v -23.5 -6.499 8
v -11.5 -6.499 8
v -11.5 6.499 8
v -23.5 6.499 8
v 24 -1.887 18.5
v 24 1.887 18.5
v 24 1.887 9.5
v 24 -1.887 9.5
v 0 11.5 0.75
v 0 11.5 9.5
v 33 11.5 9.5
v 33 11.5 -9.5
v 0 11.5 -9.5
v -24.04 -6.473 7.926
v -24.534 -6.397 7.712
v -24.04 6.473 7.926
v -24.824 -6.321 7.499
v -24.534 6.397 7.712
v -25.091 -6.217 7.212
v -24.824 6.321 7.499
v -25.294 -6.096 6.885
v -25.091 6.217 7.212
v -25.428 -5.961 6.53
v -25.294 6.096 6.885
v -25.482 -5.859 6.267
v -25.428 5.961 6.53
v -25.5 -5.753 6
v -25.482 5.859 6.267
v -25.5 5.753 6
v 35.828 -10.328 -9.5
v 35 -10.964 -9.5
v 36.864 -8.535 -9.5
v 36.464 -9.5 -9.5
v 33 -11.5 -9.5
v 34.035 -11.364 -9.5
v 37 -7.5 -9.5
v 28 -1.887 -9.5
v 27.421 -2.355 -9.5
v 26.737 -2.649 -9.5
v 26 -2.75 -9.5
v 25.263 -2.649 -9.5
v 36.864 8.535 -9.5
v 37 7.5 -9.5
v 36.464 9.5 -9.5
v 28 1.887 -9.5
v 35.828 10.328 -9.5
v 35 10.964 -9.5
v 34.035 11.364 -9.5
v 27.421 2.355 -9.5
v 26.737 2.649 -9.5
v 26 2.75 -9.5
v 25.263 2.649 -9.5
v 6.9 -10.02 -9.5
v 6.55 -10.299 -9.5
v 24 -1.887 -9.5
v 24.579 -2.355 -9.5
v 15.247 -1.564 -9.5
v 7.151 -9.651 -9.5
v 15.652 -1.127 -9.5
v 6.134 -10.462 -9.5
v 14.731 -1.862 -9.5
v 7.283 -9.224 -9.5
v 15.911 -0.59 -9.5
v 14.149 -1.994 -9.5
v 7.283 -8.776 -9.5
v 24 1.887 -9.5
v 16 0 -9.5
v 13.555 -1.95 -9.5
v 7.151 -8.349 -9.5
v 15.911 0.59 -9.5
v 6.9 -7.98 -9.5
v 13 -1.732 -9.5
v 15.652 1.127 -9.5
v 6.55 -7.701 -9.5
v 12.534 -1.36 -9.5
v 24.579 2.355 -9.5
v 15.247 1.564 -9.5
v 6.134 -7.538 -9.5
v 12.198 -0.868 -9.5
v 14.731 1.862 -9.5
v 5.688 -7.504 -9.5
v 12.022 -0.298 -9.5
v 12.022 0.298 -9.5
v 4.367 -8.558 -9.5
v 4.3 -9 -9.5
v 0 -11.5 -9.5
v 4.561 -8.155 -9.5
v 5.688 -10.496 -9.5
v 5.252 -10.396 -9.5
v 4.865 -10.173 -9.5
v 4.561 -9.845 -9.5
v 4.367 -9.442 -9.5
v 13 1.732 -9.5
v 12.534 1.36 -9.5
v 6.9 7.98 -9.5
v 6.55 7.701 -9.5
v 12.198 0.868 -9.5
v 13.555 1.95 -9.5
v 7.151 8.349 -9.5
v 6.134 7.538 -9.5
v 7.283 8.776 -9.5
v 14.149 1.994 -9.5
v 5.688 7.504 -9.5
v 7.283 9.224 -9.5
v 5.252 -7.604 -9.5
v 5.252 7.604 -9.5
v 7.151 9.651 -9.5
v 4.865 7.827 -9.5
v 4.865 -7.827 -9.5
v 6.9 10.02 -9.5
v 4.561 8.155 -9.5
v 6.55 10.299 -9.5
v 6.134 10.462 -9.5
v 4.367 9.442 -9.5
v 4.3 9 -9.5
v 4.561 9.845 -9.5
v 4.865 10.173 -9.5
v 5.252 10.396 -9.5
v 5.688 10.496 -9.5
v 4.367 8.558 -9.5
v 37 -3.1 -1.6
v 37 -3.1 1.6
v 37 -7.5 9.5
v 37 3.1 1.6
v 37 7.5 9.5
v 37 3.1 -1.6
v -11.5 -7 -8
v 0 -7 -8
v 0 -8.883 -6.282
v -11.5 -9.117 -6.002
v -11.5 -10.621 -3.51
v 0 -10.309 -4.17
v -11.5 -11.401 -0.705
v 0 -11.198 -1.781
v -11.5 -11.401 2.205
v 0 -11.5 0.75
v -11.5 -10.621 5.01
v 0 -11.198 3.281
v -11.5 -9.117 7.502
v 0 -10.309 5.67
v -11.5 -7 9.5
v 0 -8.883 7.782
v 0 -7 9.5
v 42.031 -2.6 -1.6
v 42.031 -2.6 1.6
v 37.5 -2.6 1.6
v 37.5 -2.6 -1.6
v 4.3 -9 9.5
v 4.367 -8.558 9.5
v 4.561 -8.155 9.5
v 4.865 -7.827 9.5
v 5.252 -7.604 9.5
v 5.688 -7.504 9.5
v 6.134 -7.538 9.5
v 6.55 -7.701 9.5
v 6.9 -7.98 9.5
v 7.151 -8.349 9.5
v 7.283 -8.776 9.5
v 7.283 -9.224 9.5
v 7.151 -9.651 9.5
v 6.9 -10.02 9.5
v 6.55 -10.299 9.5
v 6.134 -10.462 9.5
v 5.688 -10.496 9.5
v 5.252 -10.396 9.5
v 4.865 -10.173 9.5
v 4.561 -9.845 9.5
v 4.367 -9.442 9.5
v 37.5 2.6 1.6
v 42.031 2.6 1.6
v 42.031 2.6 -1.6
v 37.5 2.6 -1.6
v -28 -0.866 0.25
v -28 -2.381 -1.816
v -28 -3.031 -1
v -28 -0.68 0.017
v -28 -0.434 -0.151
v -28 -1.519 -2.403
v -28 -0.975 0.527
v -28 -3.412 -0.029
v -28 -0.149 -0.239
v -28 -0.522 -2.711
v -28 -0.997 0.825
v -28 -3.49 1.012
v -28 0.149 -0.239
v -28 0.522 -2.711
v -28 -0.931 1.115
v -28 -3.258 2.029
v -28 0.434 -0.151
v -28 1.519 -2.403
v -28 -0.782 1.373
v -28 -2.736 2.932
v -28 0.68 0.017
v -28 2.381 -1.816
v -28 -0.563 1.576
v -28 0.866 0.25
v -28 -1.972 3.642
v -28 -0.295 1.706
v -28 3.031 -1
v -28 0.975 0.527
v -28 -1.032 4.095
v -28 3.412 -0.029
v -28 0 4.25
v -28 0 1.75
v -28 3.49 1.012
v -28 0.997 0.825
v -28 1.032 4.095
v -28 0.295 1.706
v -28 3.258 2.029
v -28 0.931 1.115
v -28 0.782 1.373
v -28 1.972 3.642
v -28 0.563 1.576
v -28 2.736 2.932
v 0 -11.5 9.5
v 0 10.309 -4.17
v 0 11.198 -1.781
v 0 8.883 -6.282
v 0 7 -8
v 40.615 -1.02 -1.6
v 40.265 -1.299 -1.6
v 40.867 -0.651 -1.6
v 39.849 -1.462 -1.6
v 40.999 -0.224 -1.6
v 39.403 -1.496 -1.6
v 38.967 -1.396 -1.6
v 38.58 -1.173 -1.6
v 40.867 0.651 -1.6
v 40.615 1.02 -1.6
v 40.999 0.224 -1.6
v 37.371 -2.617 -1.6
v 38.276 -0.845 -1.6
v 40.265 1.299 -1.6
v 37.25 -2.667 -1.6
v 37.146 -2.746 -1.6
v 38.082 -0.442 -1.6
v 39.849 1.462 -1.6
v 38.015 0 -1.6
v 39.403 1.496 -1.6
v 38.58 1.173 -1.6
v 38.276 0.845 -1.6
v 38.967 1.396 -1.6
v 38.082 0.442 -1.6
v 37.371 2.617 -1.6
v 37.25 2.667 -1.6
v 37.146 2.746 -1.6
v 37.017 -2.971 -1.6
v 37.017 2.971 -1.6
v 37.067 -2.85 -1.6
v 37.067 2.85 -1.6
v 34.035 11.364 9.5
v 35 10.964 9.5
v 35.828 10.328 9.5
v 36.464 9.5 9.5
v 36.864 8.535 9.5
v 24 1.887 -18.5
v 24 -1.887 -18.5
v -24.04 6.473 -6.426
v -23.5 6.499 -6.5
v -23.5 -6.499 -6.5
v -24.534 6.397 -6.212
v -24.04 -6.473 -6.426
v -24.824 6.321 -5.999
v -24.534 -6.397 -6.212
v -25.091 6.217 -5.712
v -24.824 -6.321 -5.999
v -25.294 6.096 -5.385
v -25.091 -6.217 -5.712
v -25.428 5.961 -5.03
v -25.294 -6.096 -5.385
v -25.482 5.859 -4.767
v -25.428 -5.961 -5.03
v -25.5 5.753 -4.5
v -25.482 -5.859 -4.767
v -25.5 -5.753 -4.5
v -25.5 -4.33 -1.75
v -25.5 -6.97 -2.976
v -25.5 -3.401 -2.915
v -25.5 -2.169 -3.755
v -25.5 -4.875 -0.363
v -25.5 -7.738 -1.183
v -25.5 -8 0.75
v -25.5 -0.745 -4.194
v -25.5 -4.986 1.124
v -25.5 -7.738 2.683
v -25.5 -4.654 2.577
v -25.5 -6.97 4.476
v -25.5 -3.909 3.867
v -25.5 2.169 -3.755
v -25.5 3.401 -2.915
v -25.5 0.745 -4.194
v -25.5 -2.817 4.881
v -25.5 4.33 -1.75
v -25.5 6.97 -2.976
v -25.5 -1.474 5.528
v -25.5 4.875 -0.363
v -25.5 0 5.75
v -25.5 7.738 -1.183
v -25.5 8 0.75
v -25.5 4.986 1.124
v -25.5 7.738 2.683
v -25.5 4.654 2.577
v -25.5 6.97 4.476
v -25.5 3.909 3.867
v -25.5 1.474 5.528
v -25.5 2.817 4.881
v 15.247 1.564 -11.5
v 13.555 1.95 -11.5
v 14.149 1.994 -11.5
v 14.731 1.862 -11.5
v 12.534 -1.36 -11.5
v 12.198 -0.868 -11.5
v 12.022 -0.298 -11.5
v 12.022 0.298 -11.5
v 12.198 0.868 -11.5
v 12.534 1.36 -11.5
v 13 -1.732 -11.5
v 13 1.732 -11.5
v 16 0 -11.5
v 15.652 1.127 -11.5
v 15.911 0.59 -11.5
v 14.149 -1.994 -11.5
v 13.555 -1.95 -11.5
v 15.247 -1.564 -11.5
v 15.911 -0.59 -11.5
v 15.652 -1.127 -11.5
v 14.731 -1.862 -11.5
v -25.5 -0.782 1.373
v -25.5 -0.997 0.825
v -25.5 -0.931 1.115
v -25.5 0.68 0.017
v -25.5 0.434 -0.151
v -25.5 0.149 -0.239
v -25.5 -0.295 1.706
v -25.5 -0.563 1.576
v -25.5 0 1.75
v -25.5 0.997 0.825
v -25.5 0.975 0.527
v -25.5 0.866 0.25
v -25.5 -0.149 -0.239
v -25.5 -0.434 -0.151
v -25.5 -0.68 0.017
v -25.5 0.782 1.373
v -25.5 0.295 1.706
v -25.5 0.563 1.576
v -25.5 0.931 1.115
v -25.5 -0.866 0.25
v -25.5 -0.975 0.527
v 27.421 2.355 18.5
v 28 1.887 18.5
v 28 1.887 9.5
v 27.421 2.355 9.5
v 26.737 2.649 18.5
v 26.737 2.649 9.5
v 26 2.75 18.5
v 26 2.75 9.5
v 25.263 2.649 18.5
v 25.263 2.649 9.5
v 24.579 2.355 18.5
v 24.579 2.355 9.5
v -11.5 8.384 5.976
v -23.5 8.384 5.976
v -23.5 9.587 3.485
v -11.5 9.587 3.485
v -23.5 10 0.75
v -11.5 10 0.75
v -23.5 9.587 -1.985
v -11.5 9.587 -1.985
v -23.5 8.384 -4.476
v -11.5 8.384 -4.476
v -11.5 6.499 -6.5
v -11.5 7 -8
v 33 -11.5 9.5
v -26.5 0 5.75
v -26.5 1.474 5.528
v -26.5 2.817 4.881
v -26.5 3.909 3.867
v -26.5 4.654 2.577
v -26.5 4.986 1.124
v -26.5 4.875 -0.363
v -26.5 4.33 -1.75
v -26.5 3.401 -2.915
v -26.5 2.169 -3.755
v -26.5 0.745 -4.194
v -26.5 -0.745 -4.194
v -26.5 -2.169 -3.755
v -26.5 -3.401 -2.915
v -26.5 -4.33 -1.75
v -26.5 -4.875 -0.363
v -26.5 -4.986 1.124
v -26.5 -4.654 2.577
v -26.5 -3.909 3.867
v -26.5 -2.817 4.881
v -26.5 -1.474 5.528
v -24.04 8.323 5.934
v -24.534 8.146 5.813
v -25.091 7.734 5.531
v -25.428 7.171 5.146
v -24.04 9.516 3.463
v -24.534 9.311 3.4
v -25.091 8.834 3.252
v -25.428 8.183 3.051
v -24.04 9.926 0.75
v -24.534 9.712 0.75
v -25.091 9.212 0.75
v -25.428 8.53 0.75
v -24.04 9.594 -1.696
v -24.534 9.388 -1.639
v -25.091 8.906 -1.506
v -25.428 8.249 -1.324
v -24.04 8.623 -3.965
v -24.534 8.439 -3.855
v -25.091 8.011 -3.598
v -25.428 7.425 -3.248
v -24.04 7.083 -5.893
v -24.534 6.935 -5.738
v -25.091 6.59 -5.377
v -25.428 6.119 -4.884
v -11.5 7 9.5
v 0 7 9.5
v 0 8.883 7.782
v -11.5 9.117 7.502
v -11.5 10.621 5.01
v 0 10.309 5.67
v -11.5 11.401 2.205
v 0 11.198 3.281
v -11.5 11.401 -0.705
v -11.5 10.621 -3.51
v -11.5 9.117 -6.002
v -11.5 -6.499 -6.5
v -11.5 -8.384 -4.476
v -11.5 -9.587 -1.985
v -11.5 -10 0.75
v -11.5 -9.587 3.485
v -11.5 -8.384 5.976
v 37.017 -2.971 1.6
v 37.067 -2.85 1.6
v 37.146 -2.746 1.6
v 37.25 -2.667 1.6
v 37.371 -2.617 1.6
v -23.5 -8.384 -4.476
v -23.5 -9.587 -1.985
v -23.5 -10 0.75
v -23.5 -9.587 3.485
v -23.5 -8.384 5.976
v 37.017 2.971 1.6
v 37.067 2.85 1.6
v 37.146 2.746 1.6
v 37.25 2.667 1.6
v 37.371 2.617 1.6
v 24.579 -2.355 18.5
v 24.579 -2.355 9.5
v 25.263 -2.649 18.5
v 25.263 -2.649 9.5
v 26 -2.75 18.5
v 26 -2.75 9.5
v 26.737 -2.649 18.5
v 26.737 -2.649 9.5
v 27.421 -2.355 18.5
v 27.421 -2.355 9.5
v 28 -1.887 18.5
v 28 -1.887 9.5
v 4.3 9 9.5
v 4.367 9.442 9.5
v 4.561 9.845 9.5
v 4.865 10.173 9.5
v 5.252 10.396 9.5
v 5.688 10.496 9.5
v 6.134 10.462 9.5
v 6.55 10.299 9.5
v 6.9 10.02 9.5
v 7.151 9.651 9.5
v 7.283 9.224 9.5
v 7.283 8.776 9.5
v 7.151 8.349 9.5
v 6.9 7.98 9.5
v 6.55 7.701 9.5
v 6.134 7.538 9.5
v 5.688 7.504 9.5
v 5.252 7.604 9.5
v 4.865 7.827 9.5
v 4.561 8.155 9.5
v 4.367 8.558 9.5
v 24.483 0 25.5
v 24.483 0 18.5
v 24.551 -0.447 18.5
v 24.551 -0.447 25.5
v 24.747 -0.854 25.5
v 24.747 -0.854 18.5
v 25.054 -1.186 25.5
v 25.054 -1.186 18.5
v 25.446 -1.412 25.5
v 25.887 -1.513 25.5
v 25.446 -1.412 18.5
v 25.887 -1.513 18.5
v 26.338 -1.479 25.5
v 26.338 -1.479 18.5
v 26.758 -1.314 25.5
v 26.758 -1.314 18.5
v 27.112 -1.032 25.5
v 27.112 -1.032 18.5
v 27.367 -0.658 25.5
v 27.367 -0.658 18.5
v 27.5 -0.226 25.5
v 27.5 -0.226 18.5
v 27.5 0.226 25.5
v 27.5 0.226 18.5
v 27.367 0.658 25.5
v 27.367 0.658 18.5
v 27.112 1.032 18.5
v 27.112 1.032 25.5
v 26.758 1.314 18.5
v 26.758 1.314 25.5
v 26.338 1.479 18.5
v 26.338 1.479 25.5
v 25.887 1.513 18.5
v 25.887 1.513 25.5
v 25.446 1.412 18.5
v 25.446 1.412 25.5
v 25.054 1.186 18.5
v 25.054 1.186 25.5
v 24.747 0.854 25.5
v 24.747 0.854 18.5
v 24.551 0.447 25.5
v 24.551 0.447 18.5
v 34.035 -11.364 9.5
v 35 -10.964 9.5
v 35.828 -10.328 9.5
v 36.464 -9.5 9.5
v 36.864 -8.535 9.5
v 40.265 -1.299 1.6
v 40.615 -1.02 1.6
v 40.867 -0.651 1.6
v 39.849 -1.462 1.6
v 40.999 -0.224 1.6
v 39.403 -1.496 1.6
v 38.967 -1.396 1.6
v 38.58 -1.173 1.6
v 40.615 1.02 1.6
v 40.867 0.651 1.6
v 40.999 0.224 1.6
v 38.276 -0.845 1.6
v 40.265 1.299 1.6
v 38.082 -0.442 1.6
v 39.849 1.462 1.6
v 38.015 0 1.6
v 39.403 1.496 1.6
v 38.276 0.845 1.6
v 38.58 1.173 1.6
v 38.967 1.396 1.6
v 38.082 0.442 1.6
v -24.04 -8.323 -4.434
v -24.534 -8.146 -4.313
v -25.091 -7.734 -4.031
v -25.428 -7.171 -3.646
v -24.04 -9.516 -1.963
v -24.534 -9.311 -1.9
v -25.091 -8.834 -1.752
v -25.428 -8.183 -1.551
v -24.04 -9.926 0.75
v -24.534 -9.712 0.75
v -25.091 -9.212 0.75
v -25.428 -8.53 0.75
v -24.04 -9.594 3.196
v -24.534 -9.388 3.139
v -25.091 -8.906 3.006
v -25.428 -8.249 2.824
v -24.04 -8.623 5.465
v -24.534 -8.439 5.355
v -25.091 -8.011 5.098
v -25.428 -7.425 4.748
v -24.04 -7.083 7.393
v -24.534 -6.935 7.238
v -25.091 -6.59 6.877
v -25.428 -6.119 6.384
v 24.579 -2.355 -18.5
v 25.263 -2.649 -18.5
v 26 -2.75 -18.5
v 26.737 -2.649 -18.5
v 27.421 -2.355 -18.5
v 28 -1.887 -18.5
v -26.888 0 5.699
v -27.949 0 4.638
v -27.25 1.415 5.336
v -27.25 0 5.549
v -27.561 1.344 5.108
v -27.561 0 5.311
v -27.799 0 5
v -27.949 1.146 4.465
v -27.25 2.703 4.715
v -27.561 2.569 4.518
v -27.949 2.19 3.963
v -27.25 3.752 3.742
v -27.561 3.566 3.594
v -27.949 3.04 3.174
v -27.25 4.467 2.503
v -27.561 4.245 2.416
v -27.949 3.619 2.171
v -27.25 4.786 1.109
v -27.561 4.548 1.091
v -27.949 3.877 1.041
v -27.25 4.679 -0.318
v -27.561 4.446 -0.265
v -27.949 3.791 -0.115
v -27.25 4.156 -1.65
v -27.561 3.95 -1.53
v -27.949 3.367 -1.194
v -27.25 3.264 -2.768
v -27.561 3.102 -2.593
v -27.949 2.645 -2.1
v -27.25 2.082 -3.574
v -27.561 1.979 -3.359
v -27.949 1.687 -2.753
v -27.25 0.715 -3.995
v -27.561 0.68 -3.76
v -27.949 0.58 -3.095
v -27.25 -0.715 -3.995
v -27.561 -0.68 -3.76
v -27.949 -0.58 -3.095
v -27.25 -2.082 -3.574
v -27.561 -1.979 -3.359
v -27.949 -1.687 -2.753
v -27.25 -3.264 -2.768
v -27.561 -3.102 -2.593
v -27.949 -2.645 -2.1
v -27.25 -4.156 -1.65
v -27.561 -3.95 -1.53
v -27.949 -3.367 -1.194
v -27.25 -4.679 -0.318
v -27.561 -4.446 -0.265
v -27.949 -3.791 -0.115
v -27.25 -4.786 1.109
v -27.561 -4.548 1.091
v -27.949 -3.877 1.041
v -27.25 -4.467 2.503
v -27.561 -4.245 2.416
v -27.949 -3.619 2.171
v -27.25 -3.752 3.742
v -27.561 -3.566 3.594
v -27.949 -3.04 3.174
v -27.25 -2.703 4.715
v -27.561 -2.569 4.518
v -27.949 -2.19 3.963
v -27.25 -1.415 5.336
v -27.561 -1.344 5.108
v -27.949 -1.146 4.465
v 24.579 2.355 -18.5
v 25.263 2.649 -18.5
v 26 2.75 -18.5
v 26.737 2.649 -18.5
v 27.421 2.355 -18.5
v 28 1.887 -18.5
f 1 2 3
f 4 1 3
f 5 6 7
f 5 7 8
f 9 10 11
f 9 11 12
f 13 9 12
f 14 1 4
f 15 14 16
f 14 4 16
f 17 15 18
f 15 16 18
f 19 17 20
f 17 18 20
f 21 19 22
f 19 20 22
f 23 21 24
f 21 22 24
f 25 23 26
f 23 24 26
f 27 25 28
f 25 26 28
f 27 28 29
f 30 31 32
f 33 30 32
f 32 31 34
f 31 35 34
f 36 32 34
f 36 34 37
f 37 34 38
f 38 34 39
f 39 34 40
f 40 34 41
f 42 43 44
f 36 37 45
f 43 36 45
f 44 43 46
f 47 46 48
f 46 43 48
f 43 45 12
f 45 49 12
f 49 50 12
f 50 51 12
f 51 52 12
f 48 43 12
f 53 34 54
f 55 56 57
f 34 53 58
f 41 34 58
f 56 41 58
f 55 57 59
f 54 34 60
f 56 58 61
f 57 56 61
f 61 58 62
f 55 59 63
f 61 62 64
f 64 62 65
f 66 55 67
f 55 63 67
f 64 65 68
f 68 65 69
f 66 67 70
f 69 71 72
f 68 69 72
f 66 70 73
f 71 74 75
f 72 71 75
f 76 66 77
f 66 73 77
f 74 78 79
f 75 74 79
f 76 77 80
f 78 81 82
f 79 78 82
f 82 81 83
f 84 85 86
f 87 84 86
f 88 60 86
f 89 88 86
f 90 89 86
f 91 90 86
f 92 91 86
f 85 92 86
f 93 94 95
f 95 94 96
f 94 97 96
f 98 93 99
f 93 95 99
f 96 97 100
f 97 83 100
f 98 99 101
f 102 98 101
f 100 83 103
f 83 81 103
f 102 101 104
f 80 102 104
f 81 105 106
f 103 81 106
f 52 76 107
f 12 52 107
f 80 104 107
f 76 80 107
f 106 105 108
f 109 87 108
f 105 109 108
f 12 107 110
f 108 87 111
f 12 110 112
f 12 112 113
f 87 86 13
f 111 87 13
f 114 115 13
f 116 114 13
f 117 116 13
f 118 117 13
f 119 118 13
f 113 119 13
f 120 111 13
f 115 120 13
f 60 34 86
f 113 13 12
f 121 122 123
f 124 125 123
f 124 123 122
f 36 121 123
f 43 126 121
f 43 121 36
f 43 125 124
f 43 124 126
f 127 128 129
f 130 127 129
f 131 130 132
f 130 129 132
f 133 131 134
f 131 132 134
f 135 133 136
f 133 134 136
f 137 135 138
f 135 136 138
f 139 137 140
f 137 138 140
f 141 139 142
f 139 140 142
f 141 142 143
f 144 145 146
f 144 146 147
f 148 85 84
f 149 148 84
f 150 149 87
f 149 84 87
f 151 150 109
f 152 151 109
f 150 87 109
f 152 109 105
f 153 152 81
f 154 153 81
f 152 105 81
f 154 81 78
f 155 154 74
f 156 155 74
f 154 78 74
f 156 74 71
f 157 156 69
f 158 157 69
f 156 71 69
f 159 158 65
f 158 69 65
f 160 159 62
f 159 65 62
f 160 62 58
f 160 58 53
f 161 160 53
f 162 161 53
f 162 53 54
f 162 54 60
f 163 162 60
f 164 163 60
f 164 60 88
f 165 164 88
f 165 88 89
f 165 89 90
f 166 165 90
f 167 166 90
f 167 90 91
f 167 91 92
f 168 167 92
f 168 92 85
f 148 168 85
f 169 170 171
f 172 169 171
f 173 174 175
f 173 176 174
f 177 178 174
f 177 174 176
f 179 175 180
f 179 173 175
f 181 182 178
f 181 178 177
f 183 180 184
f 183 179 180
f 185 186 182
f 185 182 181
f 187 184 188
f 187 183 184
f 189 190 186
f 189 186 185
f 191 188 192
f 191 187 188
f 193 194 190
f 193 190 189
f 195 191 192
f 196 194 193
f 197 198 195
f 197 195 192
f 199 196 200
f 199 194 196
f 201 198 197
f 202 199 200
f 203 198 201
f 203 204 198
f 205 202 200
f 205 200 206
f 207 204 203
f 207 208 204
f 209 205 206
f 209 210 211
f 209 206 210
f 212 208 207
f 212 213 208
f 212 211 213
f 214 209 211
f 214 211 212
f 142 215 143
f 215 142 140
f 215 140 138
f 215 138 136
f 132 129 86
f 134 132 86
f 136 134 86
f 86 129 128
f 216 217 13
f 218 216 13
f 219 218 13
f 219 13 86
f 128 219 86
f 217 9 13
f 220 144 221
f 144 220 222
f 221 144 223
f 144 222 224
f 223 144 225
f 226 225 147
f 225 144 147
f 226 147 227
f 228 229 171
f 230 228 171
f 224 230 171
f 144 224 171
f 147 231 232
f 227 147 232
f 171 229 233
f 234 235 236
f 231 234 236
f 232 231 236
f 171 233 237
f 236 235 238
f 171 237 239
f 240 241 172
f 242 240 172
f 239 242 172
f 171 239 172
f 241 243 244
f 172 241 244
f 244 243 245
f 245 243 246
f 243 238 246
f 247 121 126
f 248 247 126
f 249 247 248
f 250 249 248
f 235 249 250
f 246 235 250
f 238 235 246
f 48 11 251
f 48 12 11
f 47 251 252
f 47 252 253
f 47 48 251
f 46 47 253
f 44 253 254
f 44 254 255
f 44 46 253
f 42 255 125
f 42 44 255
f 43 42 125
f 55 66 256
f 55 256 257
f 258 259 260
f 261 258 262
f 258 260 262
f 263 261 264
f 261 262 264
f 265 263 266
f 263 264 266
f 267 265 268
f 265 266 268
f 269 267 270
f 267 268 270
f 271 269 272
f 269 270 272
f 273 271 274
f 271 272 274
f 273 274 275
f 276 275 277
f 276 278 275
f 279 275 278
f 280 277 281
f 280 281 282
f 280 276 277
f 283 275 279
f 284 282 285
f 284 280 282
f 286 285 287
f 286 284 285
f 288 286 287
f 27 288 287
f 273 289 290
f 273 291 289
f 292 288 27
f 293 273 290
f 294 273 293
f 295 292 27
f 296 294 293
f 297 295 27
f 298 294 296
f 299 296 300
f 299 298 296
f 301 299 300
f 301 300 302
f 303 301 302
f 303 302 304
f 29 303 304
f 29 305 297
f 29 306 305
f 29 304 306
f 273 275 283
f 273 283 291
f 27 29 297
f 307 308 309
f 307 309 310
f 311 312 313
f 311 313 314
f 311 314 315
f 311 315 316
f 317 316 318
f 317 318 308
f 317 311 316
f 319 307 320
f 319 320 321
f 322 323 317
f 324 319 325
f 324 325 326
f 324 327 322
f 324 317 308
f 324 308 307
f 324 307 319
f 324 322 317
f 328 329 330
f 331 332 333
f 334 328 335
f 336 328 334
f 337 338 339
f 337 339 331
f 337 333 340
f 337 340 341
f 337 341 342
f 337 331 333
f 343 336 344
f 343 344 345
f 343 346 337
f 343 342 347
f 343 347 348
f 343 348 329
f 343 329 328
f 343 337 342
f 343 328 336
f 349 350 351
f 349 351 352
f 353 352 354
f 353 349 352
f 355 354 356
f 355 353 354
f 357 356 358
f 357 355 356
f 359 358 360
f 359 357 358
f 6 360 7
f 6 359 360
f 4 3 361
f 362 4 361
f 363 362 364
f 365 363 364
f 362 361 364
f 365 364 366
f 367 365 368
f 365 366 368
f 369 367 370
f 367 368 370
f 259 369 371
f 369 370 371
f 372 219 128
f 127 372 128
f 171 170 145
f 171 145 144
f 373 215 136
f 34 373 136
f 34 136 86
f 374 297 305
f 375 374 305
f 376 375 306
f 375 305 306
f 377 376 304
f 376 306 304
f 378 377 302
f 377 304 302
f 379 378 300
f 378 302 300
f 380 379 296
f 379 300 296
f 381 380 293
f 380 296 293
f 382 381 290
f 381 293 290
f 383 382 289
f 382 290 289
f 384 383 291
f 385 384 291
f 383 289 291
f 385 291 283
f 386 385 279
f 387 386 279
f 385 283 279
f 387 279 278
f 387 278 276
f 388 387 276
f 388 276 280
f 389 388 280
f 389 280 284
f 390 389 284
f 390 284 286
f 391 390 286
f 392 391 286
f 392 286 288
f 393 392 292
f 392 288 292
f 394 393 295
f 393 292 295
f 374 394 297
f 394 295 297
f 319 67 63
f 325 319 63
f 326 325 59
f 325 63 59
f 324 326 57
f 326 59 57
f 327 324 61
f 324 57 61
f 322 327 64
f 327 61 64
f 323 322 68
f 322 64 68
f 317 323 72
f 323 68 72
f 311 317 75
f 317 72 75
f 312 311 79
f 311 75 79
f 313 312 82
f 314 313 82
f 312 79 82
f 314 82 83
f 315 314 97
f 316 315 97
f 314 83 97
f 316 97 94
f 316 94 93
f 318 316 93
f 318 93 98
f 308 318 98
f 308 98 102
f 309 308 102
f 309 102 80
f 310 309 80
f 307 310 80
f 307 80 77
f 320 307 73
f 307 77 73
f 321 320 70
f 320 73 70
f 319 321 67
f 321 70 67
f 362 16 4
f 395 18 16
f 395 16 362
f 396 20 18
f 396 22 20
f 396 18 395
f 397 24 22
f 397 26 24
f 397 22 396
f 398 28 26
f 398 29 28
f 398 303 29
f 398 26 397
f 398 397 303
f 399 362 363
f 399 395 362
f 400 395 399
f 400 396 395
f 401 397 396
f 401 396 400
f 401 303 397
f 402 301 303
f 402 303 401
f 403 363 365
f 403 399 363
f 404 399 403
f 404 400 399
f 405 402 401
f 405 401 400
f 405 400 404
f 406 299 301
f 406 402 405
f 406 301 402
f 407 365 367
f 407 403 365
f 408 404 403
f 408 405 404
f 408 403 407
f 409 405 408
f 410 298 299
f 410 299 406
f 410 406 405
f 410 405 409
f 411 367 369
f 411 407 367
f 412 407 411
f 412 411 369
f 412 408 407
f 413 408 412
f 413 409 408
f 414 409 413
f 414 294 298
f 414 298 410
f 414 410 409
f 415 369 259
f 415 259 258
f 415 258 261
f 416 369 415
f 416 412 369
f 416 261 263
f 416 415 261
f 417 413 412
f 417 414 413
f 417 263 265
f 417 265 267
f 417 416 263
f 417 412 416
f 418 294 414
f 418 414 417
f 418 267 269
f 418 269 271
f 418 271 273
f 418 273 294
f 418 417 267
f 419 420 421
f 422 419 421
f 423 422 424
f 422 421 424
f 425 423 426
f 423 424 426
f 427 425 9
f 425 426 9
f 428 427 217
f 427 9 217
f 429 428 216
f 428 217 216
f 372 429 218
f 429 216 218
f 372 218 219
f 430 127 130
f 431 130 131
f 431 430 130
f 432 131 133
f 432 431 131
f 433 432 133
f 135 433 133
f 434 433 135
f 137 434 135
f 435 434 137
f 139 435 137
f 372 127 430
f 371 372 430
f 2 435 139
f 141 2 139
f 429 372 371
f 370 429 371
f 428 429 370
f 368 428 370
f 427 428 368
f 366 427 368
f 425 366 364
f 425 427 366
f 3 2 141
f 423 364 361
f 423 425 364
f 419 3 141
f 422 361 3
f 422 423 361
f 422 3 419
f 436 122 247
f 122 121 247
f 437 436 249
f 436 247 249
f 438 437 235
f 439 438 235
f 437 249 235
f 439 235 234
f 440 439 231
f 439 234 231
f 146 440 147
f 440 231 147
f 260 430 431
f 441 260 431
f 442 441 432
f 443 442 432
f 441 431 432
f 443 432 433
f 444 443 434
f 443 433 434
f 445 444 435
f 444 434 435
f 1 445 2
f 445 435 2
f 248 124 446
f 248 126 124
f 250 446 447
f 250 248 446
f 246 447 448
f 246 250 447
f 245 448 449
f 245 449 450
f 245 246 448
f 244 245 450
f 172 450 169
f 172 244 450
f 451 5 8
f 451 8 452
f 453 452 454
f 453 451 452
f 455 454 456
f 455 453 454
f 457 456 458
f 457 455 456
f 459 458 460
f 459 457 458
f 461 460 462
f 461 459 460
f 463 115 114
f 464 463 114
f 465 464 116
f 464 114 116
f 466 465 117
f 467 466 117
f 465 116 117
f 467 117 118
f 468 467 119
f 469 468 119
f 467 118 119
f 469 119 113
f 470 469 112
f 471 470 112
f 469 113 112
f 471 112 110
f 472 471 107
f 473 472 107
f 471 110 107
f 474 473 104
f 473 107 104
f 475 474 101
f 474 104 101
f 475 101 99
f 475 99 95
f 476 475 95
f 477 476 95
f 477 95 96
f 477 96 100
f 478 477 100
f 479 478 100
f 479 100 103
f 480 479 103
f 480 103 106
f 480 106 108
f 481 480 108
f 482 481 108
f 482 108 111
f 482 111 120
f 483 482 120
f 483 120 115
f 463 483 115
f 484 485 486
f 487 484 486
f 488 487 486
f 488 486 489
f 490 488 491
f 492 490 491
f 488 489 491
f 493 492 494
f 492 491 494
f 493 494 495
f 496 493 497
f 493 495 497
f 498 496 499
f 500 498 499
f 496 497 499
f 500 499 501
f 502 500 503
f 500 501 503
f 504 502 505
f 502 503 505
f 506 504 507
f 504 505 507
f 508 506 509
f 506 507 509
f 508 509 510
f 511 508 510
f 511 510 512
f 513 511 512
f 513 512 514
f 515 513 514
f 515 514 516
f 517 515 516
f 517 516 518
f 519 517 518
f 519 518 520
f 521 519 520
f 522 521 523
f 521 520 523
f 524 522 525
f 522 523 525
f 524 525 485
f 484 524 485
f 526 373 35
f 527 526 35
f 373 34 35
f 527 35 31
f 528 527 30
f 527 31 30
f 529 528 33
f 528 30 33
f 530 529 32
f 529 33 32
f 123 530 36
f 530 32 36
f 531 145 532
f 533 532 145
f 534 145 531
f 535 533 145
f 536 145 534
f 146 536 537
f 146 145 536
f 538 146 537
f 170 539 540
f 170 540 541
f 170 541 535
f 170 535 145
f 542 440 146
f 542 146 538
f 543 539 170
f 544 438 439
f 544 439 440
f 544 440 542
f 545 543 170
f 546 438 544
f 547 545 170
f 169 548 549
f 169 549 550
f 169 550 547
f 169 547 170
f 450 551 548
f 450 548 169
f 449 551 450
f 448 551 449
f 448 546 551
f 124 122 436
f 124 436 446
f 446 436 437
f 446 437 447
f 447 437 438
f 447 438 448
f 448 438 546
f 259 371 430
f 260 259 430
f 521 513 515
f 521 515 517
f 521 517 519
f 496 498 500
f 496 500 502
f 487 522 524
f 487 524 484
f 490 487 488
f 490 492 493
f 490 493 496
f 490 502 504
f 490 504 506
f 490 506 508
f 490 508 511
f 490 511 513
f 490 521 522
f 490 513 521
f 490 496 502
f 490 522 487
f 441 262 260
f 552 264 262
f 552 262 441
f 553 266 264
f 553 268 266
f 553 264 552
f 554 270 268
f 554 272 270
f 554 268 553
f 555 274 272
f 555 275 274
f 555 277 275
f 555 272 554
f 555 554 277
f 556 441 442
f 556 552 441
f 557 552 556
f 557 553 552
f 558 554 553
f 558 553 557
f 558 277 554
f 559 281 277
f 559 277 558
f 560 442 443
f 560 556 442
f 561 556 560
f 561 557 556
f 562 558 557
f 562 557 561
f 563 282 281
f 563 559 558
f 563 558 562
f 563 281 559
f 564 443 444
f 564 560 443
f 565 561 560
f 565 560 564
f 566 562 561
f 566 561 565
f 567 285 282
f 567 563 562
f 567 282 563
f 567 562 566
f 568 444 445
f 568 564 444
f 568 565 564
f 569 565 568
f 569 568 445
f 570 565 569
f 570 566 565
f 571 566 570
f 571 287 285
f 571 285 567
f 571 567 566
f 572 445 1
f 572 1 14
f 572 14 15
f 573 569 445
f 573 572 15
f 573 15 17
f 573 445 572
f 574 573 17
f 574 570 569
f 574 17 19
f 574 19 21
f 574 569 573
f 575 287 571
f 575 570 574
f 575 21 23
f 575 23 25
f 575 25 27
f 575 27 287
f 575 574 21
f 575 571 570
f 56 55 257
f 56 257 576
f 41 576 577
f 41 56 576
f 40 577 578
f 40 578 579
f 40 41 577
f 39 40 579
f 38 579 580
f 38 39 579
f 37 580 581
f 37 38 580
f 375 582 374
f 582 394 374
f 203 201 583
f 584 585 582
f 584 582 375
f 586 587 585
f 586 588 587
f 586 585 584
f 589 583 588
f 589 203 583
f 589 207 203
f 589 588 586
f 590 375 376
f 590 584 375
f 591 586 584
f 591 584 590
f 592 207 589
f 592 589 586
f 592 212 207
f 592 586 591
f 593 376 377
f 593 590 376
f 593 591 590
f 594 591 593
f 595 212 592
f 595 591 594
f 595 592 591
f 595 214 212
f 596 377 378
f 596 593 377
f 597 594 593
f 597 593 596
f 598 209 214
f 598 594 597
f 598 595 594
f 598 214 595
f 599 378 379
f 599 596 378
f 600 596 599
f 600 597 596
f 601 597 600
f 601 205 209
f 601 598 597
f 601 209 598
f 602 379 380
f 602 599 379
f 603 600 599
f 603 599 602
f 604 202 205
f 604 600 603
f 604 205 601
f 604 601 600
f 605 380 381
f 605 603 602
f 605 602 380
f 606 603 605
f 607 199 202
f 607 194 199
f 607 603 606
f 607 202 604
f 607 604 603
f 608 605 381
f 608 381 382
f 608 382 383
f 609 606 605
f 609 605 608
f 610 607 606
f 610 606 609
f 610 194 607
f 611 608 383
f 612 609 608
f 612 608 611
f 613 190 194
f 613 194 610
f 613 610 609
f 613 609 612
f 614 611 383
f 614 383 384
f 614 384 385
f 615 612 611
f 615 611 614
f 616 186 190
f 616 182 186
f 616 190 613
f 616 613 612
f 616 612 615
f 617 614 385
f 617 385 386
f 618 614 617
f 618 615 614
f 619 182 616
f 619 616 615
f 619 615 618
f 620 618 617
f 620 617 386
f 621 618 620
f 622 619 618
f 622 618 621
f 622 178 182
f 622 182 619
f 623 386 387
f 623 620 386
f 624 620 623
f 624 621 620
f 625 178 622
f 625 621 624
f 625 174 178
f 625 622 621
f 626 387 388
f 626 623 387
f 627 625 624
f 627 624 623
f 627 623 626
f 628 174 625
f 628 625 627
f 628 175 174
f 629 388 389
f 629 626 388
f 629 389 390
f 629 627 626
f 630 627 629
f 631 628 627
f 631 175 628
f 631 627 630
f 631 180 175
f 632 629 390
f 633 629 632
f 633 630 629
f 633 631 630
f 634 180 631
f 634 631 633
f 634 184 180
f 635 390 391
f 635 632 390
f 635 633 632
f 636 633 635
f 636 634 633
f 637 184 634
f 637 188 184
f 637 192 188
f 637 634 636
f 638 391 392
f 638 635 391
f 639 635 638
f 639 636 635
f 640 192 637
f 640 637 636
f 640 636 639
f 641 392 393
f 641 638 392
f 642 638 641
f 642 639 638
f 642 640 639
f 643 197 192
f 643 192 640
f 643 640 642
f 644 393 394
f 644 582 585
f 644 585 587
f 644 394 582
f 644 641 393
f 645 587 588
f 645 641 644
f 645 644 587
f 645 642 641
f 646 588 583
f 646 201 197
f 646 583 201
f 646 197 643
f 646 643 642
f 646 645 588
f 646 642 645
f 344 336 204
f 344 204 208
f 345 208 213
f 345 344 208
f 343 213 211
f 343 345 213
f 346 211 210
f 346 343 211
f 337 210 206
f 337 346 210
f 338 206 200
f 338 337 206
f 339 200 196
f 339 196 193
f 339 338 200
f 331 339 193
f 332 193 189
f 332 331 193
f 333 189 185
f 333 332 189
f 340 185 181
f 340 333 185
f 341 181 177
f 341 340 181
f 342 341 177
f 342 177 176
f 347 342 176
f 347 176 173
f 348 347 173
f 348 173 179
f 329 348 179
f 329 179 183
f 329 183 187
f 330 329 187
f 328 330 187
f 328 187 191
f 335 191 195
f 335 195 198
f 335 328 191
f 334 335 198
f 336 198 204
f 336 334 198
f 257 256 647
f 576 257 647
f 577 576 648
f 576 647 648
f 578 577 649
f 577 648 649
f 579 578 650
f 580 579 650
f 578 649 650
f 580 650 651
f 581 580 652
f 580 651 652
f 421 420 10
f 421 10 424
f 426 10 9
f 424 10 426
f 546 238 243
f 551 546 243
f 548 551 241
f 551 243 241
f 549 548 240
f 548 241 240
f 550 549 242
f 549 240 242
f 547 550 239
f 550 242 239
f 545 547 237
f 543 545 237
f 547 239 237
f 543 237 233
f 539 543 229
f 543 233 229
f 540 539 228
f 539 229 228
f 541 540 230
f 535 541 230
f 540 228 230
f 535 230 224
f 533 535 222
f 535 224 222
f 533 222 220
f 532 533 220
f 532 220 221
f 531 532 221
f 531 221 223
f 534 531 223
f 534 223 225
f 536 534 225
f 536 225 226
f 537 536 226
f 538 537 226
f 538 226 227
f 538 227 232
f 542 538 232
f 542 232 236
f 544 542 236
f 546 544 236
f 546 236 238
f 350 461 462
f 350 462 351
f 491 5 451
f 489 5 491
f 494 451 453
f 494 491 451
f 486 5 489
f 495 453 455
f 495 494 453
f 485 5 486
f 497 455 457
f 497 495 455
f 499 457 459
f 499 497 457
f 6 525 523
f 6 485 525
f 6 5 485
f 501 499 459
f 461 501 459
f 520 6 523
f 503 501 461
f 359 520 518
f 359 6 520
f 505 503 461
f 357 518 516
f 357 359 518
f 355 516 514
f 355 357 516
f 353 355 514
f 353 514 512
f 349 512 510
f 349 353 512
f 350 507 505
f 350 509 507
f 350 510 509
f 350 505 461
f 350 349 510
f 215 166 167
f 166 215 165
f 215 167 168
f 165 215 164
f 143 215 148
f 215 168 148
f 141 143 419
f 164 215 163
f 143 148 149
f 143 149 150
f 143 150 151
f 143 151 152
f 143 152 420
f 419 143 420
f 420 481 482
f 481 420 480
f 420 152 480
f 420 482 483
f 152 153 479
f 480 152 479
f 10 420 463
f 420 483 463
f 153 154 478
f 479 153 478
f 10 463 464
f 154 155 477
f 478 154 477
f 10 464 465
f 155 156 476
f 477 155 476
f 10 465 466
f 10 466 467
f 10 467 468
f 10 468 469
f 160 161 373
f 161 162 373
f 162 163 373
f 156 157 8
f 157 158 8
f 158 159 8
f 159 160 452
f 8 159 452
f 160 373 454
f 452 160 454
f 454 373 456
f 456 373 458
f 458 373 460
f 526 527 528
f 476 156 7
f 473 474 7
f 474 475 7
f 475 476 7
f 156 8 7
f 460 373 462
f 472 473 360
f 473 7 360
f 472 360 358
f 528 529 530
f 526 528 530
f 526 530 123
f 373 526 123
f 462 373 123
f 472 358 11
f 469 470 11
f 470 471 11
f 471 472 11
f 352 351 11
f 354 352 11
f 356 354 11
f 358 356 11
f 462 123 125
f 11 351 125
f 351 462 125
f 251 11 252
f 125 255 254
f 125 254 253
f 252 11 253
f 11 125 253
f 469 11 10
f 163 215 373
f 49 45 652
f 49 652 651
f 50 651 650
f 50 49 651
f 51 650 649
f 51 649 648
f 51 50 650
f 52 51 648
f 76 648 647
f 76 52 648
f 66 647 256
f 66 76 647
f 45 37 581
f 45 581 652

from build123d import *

# Parameters (mm, degrees)
ESBO_O1_W                     = 19
ESBO_O1_H                     = 23
RESSALTO_EXTRUS_O1_DEPTH      = 37
FILETE3_R                     = 4
ESBO_O2_W                     = 3.2
ESBO_O2_H                     = 5.2
RESSALTO_EXTRUS_O2_DEPTH      = 5.030814575
ESBO_O4_R                     = 1.5
CORTE_EXTRUS_O1_DEPTH         = 45.967203313
FILETE4_R                     = 0.5
FILETE5_R                     = 0.5
RESSALTO_EXTRUS_O6_DEPTH      = 9
RESSALTO_EXTRUS_O6_DEPTH_BACK = 28
ESBO_O10_R                    = 2
RESSALTO_EXTRUS_O7_DEPTH      = 2
RESSALTO_EXTRUS_O8_DEPTH      = 11.5
RESSALTO_EXTRUS_O9_DEPTH      = 14
FILETE6_R                     = 2
ESBO_O13_R                    = 5
ESBO_O13_R_2                  = 1
RESSALTO_EXTRUS_O12_DEPTH     = 2.5
FILETE7_R                     = 1.5
ESBO_O14_R                    = 1.5
CORTE_EXTRUS_O2_DEPTH         = 52.796132807
ESBO_O16_R                    = 1.516823529
RESSALTO_EXTRUS_O14_DEPTH     = 7


with BuildPart() as part:
    # Esboço1 → Ressalto-extrusão1 (new body)
    with BuildSketch(Plane(origin=(0, 0, 0), x_dir=(0, 0, -1), z_dir=(1, 0, 0))):
        Rectangle(ESBO_O1_W, ESBO_O1_H)
    extrude(amount=RESSALTO_EXTRUS_O1_DEPTH)

    # Filete3
    filete3_edges = [part.edges().sort_by_distance(p)[0] for p in [
        (37, -11.5, 0),
        (37, 11.5, 0),
    ]]
    fillet(filete3_edges, radius=FILETE3_R)

    # Esboço2 → Ressalto-extrusão2 (add)
    with BuildSketch(Plane(origin=(37, 0, 0), x_dir=(0, 0, -1), z_dir=(1, 0, 0))):
        Rectangle(ESBO_O2_W, ESBO_O2_H)
    extrude(amount=RESSALTO_EXTRUS_O2_DEPTH)

    # Esboço4 → Corte-extrusão1 (cut, through all)
    with BuildSketch(Plane(origin=(0, 0, -1.6), x_dir=(-1, 0, 0), z_dir=(0, 0, -1))):
        with Locations((-39.515407287, 0)):
            Circle(ESBO_O4_R)
    extrude(amount=-CORTE_EXTRUS_O1_DEPTH, mode=Mode.SUBTRACT)

    # Filete4
    filete4_edges = [part.edges().sort_by_distance(p)[0] for p in [
        (37, 2.6, 0),
    ]]
    fillet(filete4_edges, radius=FILETE4_R)

    # Filete5
    filete5_edges = [part.edges().sort_by_distance(p)[0] for p in [
        (37, -2.6, 0),
    ]]
    fillet(filete5_edges, radius=FILETE5_R)

    # Esboço6 → Ressalto-extrusão6 (add, two sides: drawn at the far end of the back side and taken through both)
    with BuildSketch(Plane(origin=(0, 0, -9.5), x_dir=(-1, 0, 0), z_dir=(0, 0, -1)).offset(-RESSALTO_EXTRUS_O6_DEPTH_BACK)):
        with BuildLine():
            Line((-28, -1.887458609), (-28, 1.887458609))
            ThreePointArc((-28, 1.887458609), (-26, 2.75), (-24, 1.887458609))
            Line((-24, 1.887458609), (-24, -1.887458609))
            ThreePointArc((-24, -1.887458609), (-26, -2.75), (-28, -1.887458609))
        make_face()
    extrude(amount=RESSALTO_EXTRUS_O6_DEPTH + RESSALTO_EXTRUS_O6_DEPTH_BACK)

    # Esboço10 → Ressalto-extrusão7 (add)
    with BuildSketch(Plane(origin=(0, 0, -9.5), x_dir=(-1, 0, 0), z_dir=(0, 0, -1))):
        with Locations(Location((-14, 0, 0), (0, 0, 180))):
            Circle(ESBO_O10_R)
    extrude(amount=RESSALTO_EXTRUS_O7_DEPTH)

    # Esboço11 → Ressalto-extrusão8 (add)
    with BuildSketch(Plane.ZY):
        with BuildLine():
            Line((9.5, -7), (9.5, 7))
            ThreePointArc((9.5, 7), (0.75, 11.5), (-8, 7))
            Line((-8, 7), (-8, -7))
            ThreePointArc((-8, -7), (0.75, -11.5), (9.5, -7))
        make_face()
    extrude(amount=RESSALTO_EXTRUS_O8_DEPTH)

    # Esboço12 → Ressalto-extrusão9 (add)
    with BuildSketch(Plane.ZY.offset(11.5)):
        with BuildLine():
            Line((-6.5, 6.498793601), (-6.5, -6.498793601))
            ThreePointArc((-6.5, -6.498793601), (0.75, -10), (8, -6.498793601))
            Line((8, -6.498793601), (8, 6.498793601))
            ThreePointArc((8, 6.498793601), (0.75, 10), (-6.5, 6.498793601))
        make_face()
    extrude(amount=RESSALTO_EXTRUS_O9_DEPTH)

    # Filete6
    filete6_edges = [part.edges().sort_by_distance(p)[0] for p in [
        (-25.5, 10, 0.75),
        (-25.5, 0, -6.5),
        (-25.5, -10, 0.75),
        (-25.5, 0, 8),
    ]]
    fillet(filete6_edges, radius=FILETE6_R)

    # Esboço13 → Ressalto-extrusão12 (add)
    with BuildSketch(Plane.ZY.offset(25.5)):
        with Locations((0.75, 0)):
            Circle(ESBO_O13_R)
        with Locations((0.75, 0)):
            Circle(ESBO_O13_R_2, mode=Mode.SUBTRACT)
    extrude(amount=RESSALTO_EXTRUS_O12_DEPTH)

    # Filete7
    filete7_edges = [part.edges().sort_by_distance(p)[0] for p in [
        (-28, 0, -4.25),
    ]]
    fillet(filete7_edges, radius=FILETE7_R)

    # Esboço14 → Corte-extrusão2 (cut, through all)
    with BuildSketch(Plane(origin=(0, 0, -9.5), x_dir=(-1, 0, 0), z_dir=(0, 0, -1))):
        with Locations((-5.8, 9)):
            Circle(ESBO_O14_R)
        with Locations((-5.8, -9)):
            Circle(ESBO_O14_R)
    extrude(amount=-CORTE_EXTRUS_O2_DEPTH, mode=Mode.SUBTRACT)

    # Esboço16 → Ressalto-extrusão14 (add)
    with BuildSketch(Plane.XY.offset(18.5)):
        with Locations(Location((26, 0, 0), (0, 0, 180))):
            Circle(ESBO_O16_R)
    extrude(amount=RESSALTO_EXTRUS_O14_DEPTH)


solid = part.part
